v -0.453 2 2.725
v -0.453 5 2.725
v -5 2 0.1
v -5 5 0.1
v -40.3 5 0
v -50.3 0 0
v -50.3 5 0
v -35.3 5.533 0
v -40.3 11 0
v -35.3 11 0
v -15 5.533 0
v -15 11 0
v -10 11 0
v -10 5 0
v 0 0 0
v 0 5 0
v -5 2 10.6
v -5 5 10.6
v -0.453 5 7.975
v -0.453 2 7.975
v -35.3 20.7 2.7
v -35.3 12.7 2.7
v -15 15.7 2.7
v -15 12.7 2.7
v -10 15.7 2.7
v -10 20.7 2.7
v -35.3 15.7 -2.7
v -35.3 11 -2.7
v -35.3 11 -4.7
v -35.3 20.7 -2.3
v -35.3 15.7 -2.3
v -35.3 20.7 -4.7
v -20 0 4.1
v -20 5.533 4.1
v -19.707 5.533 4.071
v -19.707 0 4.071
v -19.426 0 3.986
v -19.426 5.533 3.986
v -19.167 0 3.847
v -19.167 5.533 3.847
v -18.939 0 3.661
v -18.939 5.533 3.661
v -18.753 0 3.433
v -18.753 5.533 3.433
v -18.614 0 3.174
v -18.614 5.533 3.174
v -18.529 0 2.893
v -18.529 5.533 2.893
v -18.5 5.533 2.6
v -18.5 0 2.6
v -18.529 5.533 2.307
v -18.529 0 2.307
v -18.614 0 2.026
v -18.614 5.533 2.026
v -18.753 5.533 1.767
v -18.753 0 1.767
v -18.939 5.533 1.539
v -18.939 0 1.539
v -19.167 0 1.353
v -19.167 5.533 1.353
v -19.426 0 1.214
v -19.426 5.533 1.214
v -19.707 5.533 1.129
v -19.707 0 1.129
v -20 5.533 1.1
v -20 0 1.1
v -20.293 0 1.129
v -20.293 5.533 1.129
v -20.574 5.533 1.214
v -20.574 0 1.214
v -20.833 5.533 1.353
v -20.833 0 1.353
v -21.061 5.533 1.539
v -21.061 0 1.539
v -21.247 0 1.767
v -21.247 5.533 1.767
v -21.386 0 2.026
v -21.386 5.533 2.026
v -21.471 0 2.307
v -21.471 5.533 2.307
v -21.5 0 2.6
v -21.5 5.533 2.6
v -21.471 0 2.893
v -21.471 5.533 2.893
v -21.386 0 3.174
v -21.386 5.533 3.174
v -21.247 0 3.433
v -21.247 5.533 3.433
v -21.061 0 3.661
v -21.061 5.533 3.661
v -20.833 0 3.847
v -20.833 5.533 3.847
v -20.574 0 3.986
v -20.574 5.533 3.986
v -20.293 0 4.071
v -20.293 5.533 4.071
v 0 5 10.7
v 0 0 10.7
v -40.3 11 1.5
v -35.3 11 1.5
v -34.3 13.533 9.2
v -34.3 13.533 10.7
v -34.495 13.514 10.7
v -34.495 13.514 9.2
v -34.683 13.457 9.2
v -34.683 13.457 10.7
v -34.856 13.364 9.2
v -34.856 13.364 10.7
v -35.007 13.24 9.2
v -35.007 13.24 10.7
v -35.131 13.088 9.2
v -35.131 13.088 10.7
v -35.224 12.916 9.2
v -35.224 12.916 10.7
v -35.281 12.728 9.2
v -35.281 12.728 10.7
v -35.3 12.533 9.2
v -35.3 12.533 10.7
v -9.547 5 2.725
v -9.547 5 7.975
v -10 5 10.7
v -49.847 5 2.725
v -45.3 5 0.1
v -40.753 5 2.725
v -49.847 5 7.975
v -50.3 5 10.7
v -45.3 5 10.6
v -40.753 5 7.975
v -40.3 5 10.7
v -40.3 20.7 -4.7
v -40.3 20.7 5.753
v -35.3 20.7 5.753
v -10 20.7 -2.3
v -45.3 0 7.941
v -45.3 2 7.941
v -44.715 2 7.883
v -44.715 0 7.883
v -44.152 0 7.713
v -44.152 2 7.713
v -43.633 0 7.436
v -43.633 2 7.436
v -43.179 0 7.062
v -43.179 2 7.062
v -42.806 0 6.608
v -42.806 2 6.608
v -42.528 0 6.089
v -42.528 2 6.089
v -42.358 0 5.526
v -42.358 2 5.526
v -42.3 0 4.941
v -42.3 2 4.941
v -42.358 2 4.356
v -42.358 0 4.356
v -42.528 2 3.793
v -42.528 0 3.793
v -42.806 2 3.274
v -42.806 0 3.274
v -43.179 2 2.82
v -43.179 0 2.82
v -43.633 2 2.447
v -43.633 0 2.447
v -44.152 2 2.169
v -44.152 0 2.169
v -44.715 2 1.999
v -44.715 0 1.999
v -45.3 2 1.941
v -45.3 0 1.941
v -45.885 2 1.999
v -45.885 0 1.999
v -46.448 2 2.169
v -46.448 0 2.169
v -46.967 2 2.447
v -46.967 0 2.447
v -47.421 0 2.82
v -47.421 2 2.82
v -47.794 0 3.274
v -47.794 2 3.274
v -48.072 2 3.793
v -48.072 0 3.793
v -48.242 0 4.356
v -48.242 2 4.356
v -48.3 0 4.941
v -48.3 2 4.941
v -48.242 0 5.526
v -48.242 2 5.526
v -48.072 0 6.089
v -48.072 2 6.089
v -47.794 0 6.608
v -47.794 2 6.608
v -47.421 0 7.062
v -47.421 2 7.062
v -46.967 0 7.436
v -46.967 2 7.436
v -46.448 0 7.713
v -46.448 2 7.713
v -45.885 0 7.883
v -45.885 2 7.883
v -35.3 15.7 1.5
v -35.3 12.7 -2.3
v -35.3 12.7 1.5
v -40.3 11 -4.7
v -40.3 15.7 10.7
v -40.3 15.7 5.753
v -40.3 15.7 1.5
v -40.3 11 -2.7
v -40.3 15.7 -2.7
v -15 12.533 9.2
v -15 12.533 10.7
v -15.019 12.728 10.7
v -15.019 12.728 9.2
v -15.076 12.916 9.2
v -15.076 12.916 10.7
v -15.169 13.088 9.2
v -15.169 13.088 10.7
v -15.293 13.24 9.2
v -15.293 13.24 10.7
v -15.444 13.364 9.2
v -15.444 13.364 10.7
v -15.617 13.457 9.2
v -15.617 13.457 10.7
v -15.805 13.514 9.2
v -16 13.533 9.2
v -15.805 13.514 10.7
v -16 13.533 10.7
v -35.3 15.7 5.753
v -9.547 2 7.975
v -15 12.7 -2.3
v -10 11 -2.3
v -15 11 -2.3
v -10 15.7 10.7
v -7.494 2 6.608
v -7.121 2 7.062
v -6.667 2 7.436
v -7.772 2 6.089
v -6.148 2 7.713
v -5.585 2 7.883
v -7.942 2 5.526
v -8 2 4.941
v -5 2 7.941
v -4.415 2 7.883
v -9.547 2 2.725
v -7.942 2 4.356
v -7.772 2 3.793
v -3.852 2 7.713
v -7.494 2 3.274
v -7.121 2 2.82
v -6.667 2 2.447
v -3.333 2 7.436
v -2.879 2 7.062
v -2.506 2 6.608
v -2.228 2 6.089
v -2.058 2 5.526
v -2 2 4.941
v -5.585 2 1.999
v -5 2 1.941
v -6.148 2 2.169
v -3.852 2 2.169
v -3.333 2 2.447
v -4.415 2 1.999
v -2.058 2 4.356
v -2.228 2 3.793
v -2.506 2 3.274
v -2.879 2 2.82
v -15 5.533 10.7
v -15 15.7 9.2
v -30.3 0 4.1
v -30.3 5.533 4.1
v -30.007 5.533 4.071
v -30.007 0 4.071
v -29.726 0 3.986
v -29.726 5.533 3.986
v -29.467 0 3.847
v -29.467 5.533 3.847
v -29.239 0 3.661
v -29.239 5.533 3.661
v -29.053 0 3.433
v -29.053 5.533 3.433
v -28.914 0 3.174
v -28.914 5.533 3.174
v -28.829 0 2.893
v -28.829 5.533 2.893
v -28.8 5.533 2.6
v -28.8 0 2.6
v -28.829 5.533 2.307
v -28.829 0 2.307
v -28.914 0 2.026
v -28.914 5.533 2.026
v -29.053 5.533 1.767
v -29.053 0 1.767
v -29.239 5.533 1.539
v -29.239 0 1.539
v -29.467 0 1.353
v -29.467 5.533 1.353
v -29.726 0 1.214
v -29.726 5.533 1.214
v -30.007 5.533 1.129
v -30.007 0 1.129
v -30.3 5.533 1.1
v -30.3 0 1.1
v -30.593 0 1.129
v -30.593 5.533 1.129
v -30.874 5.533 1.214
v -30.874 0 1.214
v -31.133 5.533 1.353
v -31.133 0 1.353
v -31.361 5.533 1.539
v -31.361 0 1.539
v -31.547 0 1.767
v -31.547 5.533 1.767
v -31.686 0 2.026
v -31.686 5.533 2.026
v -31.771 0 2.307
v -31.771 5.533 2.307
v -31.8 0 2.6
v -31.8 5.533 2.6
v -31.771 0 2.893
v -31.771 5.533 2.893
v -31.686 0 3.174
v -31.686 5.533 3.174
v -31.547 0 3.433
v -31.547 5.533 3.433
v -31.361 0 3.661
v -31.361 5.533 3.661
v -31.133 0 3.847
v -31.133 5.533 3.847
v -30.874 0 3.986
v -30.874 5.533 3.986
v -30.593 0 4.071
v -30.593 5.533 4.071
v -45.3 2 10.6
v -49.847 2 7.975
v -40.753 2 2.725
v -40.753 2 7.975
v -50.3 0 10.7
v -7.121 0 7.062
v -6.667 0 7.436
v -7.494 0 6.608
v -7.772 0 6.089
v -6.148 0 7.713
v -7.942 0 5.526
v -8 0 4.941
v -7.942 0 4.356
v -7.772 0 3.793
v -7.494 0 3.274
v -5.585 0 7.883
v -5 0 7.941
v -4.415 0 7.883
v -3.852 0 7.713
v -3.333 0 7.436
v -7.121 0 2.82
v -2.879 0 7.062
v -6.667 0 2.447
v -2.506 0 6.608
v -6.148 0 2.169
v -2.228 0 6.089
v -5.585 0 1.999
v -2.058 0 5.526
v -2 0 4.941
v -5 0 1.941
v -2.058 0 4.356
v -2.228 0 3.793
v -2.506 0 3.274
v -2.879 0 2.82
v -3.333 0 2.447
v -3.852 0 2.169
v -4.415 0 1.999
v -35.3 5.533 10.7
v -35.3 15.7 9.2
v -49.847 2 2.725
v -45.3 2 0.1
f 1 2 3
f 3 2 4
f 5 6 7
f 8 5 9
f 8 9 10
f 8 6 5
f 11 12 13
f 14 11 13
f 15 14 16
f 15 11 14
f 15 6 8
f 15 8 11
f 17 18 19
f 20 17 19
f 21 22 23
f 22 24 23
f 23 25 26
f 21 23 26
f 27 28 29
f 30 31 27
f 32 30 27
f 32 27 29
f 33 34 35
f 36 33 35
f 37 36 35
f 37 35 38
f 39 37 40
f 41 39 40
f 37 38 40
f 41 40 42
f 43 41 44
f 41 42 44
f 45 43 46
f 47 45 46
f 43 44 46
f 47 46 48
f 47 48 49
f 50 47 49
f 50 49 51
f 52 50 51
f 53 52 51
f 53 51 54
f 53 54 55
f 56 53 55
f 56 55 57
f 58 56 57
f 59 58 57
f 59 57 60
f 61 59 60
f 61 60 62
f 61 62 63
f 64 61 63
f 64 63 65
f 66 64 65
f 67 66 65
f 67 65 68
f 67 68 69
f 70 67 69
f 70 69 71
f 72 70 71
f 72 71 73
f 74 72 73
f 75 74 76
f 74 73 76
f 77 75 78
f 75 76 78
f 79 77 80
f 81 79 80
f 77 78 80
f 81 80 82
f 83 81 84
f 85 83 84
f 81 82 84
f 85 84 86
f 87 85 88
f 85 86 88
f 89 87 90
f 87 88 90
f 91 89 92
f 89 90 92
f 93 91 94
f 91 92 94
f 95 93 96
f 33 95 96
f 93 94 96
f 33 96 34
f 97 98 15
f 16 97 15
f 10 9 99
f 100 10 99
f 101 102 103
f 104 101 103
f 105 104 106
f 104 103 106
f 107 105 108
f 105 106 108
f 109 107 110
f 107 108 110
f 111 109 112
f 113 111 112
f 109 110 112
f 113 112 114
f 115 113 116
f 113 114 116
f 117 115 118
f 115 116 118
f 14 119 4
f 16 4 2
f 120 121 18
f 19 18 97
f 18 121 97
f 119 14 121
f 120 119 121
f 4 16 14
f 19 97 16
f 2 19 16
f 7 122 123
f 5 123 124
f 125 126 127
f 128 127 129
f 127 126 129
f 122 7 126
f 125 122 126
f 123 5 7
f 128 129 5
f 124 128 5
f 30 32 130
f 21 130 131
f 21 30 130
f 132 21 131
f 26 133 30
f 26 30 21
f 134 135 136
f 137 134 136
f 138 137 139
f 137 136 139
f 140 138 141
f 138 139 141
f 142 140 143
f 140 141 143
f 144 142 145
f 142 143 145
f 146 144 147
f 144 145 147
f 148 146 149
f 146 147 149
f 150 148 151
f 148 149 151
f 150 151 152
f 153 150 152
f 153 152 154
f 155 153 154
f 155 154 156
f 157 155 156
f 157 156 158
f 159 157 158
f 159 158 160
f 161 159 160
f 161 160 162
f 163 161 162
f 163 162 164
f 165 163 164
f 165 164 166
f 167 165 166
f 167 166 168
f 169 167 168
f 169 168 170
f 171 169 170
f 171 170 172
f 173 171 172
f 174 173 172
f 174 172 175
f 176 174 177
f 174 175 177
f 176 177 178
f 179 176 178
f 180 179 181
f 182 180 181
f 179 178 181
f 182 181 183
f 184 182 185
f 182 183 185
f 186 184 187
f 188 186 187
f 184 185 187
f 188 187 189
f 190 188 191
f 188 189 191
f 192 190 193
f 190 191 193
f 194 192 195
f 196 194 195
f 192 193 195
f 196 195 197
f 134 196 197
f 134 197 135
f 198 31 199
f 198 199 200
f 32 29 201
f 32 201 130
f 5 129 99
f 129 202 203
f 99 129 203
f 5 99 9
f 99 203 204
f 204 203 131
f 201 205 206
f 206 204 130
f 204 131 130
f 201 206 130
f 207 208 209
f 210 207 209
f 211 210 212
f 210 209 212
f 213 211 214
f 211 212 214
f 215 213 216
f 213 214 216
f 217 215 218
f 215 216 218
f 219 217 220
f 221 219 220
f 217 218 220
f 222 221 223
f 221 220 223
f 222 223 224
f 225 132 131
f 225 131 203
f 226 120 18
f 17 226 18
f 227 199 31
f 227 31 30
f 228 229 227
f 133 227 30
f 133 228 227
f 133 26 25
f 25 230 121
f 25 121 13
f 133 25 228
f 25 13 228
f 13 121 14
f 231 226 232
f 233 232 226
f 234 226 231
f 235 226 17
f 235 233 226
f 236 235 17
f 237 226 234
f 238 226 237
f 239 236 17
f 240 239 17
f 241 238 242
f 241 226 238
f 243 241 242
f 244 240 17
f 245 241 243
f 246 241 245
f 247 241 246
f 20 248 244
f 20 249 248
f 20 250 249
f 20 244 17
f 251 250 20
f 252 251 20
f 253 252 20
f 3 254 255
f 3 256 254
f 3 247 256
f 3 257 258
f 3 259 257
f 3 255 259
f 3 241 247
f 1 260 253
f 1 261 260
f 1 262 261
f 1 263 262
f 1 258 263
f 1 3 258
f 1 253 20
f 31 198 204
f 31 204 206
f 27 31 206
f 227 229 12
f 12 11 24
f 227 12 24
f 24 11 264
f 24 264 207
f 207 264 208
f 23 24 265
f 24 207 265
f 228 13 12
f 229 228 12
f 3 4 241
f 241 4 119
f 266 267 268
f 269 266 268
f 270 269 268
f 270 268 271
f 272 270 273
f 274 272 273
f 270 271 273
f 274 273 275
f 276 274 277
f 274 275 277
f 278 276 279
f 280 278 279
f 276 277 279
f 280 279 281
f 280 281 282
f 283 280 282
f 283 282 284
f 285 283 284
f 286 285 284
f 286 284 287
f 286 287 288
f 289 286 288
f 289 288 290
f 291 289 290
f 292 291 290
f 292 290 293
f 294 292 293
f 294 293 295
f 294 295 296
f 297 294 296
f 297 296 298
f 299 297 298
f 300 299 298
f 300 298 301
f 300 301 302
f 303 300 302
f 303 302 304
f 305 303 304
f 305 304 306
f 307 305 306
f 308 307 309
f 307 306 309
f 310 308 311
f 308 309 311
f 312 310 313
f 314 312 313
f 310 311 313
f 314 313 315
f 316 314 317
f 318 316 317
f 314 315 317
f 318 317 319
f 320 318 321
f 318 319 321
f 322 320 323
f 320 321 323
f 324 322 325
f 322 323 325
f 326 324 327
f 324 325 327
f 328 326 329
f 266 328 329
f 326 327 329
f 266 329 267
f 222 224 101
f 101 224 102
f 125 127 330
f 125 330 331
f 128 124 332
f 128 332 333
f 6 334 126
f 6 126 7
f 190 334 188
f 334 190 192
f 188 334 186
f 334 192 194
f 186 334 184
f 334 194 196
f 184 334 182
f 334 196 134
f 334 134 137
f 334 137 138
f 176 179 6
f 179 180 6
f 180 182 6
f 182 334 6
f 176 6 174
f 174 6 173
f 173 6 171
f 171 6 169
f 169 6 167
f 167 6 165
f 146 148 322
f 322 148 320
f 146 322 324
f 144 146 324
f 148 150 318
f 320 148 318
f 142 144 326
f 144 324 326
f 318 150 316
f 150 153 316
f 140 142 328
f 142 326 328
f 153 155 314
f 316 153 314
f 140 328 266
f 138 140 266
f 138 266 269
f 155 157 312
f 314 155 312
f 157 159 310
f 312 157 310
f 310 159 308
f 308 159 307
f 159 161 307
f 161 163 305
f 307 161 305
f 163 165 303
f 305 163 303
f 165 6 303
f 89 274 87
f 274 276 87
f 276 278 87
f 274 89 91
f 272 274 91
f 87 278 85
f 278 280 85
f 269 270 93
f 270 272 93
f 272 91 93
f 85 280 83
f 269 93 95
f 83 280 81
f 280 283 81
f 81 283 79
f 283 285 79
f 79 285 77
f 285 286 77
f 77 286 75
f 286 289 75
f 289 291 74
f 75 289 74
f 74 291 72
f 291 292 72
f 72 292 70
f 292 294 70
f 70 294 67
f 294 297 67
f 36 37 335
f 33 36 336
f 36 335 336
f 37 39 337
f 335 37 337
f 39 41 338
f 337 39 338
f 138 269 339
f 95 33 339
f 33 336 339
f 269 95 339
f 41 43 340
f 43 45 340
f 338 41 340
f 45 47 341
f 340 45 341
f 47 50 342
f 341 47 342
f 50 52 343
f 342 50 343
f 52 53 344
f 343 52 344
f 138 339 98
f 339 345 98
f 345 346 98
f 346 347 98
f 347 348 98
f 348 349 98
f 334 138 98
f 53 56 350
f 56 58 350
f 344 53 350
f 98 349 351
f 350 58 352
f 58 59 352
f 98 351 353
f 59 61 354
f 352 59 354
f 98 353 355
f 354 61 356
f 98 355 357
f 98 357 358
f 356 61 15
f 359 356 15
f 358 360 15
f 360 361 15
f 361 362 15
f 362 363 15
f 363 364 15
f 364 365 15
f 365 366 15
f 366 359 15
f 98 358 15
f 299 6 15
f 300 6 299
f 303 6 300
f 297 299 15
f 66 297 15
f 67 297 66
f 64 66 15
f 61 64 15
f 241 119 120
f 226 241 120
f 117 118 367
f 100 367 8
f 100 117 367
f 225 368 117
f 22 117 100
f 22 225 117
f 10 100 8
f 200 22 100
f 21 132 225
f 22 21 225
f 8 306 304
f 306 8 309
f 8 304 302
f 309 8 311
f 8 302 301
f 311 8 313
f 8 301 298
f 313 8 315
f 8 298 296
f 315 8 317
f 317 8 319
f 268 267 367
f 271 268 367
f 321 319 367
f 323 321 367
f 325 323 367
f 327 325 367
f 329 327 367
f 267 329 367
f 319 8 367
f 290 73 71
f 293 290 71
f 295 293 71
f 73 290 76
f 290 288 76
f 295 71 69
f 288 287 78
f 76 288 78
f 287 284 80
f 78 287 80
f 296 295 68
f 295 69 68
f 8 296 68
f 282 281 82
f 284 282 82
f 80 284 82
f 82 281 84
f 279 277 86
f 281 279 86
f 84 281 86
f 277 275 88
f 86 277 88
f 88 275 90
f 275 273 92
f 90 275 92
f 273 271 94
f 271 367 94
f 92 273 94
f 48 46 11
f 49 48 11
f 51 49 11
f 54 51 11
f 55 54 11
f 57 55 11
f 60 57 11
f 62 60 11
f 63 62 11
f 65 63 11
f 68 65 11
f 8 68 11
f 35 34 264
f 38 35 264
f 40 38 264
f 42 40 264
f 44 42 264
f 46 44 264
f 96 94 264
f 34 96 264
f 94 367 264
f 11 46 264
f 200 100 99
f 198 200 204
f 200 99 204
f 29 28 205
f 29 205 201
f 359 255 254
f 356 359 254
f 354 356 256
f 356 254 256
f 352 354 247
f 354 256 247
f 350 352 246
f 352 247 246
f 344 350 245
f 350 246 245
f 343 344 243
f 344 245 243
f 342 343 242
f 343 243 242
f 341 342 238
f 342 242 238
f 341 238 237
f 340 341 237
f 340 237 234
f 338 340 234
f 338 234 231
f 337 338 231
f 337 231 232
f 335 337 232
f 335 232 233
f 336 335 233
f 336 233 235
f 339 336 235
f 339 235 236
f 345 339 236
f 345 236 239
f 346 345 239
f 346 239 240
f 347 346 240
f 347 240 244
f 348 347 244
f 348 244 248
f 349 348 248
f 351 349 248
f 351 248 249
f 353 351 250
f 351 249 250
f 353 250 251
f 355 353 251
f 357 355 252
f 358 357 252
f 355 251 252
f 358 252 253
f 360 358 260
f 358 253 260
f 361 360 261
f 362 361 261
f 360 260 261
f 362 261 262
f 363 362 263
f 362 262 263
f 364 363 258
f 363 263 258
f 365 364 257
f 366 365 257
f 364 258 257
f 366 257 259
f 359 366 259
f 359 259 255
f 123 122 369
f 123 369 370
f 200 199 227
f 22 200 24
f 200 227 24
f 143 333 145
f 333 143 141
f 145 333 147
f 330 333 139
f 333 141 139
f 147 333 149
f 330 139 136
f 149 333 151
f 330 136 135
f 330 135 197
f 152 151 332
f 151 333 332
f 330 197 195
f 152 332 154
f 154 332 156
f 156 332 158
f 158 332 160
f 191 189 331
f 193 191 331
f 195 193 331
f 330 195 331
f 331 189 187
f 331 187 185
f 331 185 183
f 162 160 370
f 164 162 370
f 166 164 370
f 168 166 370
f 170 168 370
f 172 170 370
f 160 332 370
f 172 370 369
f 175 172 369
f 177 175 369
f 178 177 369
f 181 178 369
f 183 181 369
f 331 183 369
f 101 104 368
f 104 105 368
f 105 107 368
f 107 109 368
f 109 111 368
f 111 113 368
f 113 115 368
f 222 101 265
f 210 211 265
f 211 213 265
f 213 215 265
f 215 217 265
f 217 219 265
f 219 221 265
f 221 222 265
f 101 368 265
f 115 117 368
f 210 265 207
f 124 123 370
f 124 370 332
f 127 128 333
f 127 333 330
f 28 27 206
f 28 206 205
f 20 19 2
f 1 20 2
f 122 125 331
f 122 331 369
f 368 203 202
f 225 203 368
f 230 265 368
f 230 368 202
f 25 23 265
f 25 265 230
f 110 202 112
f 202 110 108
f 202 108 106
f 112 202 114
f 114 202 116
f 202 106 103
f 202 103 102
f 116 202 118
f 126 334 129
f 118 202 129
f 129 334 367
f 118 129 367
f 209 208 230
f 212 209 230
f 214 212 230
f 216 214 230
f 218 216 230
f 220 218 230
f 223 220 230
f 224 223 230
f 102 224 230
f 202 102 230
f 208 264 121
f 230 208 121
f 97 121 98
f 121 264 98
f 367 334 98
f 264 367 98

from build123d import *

# Parameters (mm, degrees)
CROQUIS1_W              = 50.3
CROQUIS1_H              = 10.7
SALIENTE_EXTRUIR1_DEPTH = 15.7
CORTAR_EXTRUIR1_REACH   = 55.769
CROQUIS2_W              = 10
CROQUIS2_H              = 10.7
CORTAR_EXTRUIR2_REACH   = 55.769
CROQUIS3_W              = 20.3
CROQUIS3_H              = 9.2
CORTAR_EXTRUIR3_REACH   = 46.554
CROQUIS4_W              = 1.5
CROQUIS4_H              = 4.7
CORTAR_EXTRUIR5_REACH   = 54.527
CROQUIS6_R              = 3
CORTAR_EXTRUIR6_REACH   = 54.421
CROQUIS7_R              = 1.5
CORTAR_EXTRUIR7_DEPTH   = 3
SALIENTE_EXTRUIR2_DEPTH = 5
CROQUIS11_W             = 5
CROQUIS11_H             = 4.7
SALIENTE_EXTRUIR3_DEPTH = 2.3
CROQUIS12_W             = 10
CROQUIS12_H             = 5
SALIENTE_EXTRUIR5_DEPTH = 3
CROQUIS13_W             = 15
CROQUIS13_H             = 5
SALIENTE_EXTRUIR6_DEPTH = 5
CROQUIS14_W             = 5
CROQUIS14_H             = 8
SALIENTE_EXTRUIR7_DEPTH = 10.3


with BuildPart() as part:
    # Croquis1 → Saliente-Extruir1 (new body)
    with BuildSketch(Plane(origin=(0, 0, 0), x_dir=(1, 0, 0), z_dir=(0, 1, 0))):
        with Locations((-25.15, -5.35)):
            Rectangle(CROQUIS1_W, CROQUIS1_H)
    extrude(amount=SALIENTE_EXTRUIR1_DEPTH)

    # Croquis2 → Cortar-Extruir1 (cut, up to next)
    with BuildSketch(Plane.XY.offset(10.7), mode=Mode.PRIVATE) as cortar_extruir1_sk1:
        with Locations((-45.3, 10.35)):
            Rectangle(CROQUIS2_W, CROQUIS2_H)
    cortar_extruir1_tool1 = extrude(cortar_extruir1_sk1.sketch, amount=-CORTAR_EXTRUIR1_REACH, mode=Mode.PRIVATE) & part.part
    # Croquis2 → Cortar-Extruir1 (cut, up to next)
    with BuildSketch(Plane.XY.offset(10.7), mode=Mode.PRIVATE) as cortar_extruir1_sk2:
        with BuildLine():
            Line((-35.3, 5.532906309), (-15, 5.532906309))
            Line((-15, 5.532906309), (-15, 12.532906309))
            ThreePointArc((-15, 12.532906309), (-15.292893219, 13.240013091), (-16, 13.532906309))
            Line((-16, 13.532906309), (-34.3, 13.532906309))
            ThreePointArc((-34.3, 13.532906309), (-35.007106781, 13.240013091), (-35.3, 12.532906309))
            Line((-35.3, 12.532906309), (-35.3, 5.532906309))
        make_face()
    cortar_extruir1_tool2 = extrude(cortar_extruir1_sk2.sketch, amount=-CORTAR_EXTRUIR1_REACH, mode=Mode.PRIVATE) & part.part
    # Croquis2 → Cortar-Extruir1 (cut, up to next)
    with BuildSketch(Plane.XY.offset(10.7), mode=Mode.PRIVATE) as cortar_extruir1_sk3:
        with Locations((-5, 10.35)):
            Rectangle(CROQUIS2_W, CROQUIS2_H)
    cortar_extruir1_tool3 = extrude(cortar_extruir1_sk3.sketch, amount=-CORTAR_EXTRUIR1_REACH, mode=Mode.PRIVATE) & part.part
    add(cortar_extruir1_tool1.solids().sort_by_distance((-45.3, 10.35, 10.7))[0], mode=Mode.SUBTRACT)
    add(cortar_extruir1_tool2.solids().sort_by_distance((-25.15, 9.522899, 10.7))[0], mode=Mode.SUBTRACT)
    add(cortar_extruir1_tool3.solids().sort_by_distance((-5, 10.35, 10.7))[0], mode=Mode.SUBTRACT)

    # Croquis3 → Cortar-Extruir2 (cut, up to next)
    with BuildSketch(Plane(origin=(0, 15.7, 0), x_dir=(1, 0, 0), z_dir=(0, 1, 0)), mode=Mode.PRIVATE) as cortar_extruir2_sk1:
        with Locations((-25.15, -4.6)):
            Rectangle(CROQUIS3_W, CROQUIS3_H)
    cortar_extruir2_tool1 = extrude(cortar_extruir2_sk1.sketch, amount=-CORTAR_EXTRUIR2_REACH, mode=Mode.PRIVATE) & part.part
    add(cortar_extruir2_tool1.solids().sort_by_distance((-25.15, 15.7, 4.6))[0], mode=Mode.SUBTRACT)

    # Croquis4 → Cortar-Extruir3 (cut, up to next)
    with BuildSketch(Plane.ZY.offset(40.3), mode=Mode.PRIVATE) as cortar_extruir3_sk1:
        with Locations((0.75, 13.35)):
            Rectangle(CROQUIS4_W, CROQUIS4_H)
    cortar_extruir3_tool1 = extrude(cortar_extruir3_sk1.sketch, amount=-CORTAR_EXTRUIR3_REACH, mode=Mode.PRIVATE) & part.part
    add(cortar_extruir3_tool1.solids().sort_by_distance((-40.3, 13.35, 0.75))[0], mode=Mode.SUBTRACT)

    # Croquis6 → Cortar-Extruir5 (cut, up to next)
    with BuildSketch(Plane(origin=(0, 5, 0), x_dir=(1, 0, 0), z_dir=(0, 1, 0)), mode=Mode.PRIVATE) as cortar_extruir5_sk1:
        with Locations(Location((-45.3, -4.941101113, 0), (0, 0, 270))):
            Circle(CROQUIS6_R)
    cortar_extruir5_tool1 = extrude(cortar_extruir5_sk1.sketch, amount=-CORTAR_EXTRUIR5_REACH, mode=Mode.PRIVATE) & part.part
    # Croquis6 → Cortar-Extruir5 (cut, up to next)
    with BuildSketch(Plane(origin=(0, 5, 0), x_dir=(1, 0, 0), z_dir=(0, 1, 0)), mode=Mode.PRIVATE) as cortar_extruir5_sk2:
        with Locations(Location((-5, -4.941101113, 0), (0, 0, 90))):
            Circle(CROQUIS6_R)
    cortar_extruir5_tool2 = extrude(cortar_extruir5_sk2.sketch, amount=-CORTAR_EXTRUIR5_REACH, mode=Mode.PRIVATE) & part.part
    add(cortar_extruir5_tool1.solids().sort_by_distance((-45.3, 5, 4.941101))[0], mode=Mode.SUBTRACT)
    add(cortar_extruir5_tool2.solids().sort_by_distance((-5, 5, 4.941101))[0], mode=Mode.SUBTRACT)

    # Croquis7 → Cortar-Extruir6 (cut, up to next)
    with BuildSketch(Plane(origin=(0, 5.532906309, 0), x_dir=(1, 0, 0), z_dir=(0, 1, 0)), mode=Mode.PRIVATE) as cortar_extruir6_sk1:
        with Locations(Location((-30.3, -2.6, 0), (0, 0, 270))):
            Circle(CROQUIS7_R)
    cortar_extruir6_tool1 = extrude(cortar_extruir6_sk1.sketch, amount=-CORTAR_EXTRUIR6_REACH, mode=Mode.PRIVATE) & part.part
    # Croquis7 → Cortar-Extruir6 (cut, up to next)
    with BuildSketch(Plane(origin=(0, 5.532906309, 0), x_dir=(1, 0, 0), z_dir=(0, 1, 0)), mode=Mode.PRIVATE) as cortar_extruir6_sk2:
        with Locations(Location((-20, -2.6, 0), (0, 0, 270))):
            Circle(CROQUIS7_R)
    cortar_extruir6_tool2 = extrude(cortar_extruir6_sk2.sketch, amount=-CORTAR_EXTRUIR6_REACH, mode=Mode.PRIVATE) & part.part
    add(cortar_extruir6_tool1.solids().sort_by_distance((-30.3, 5.532906, 2.6))[0], mode=Mode.SUBTRACT)
    add(cortar_extruir6_tool2.solids().sort_by_distance((-20, 5.532906, 2.6))[0], mode=Mode.SUBTRACT)

    # Croquis8 → Cortar-Extruir7 (cut)
    with BuildSketch(Plane(origin=(0, 5, 0), x_dir=(1, 0, 0), z_dir=(0, 1, 0))):
        Polygon((-5, -0.1), (-9.54663337, -2.725), (-9.54663337, -7.975), (-5, -10.6), (-0.45336663, -7.975), (-0.45336663, -2.725), align=None)
        Polygon((-49.84663337, -2.725), (-45.3, -0.1), (-40.75336663, -2.725), (-40.75336663, -7.975), (-45.3, -10.6), (-49.84663337, -7.975), align=None)
    extrude(amount=-CORTAR_EXTRUIR7_DEPTH, mode=Mode.SUBTRACT)

    # Croquis9 → Saliente-Extruir2 (add)
    with BuildSketch(Plane(origin=(-35.3, 0, 0), x_dir=(0, 0, -1), z_dir=(1, 0, 0))):
        Polygon((-1.5, 15.7), (2.7, 15.7), (2.7, 11), (4.7, 11), (4.7, 20.7), (-5.753105751, 20.7), (-5.753105751, 15.7), align=None)
    extrude(amount=-SALIENTE_EXTRUIR2_DEPTH)

    # Croquis11 → Saliente-Extruir3 (add)
    with BuildSketch(Plane(origin=(0, 0, 0), x_dir=(-1, 0, 0), z_dir=(0, 0, -1))):
        with Locations((12.5, 13.35)):
            Rectangle(CROQUIS11_W, CROQUIS11_H)
    extrude(amount=SALIENTE_EXTRUIR3_DEPTH)

    # Croquis12 → Saliente-Extruir5 (add)
    with BuildSketch(Plane(origin=(0, 15.7, 0), x_dir=(1, 0, 0), z_dir=(0, 1, 0))):
        with Locations((-20, -0.2)):
            Rectangle(CROQUIS12_W, CROQUIS12_H)
    extrude(amount=-SALIENTE_EXTRUIR5_DEPTH)

    # Croquis13 → Saliente-Extruir6 (add)
    with BuildSketch(Plane(origin=(0, 15.7, 0), x_dir=(1, 0, 0), z_dir=(0, 1, 0))):
        with Locations((-17.5, -0.2)):
            Rectangle(CROQUIS13_W, CROQUIS13_H)
    extrude(amount=SALIENTE_EXTRUIR6_DEPTH)

    # Croquis14 → Saliente-Extruir7 (add)
    with BuildSketch(Plane.ZY.offset(25)):
        with Locations((0.2, 16.7)):
            Rectangle(CROQUIS14_W, CROQUIS14_H)
    extrude(amount=SALIENTE_EXTRUIR7_DEPTH)


solid = part.part
